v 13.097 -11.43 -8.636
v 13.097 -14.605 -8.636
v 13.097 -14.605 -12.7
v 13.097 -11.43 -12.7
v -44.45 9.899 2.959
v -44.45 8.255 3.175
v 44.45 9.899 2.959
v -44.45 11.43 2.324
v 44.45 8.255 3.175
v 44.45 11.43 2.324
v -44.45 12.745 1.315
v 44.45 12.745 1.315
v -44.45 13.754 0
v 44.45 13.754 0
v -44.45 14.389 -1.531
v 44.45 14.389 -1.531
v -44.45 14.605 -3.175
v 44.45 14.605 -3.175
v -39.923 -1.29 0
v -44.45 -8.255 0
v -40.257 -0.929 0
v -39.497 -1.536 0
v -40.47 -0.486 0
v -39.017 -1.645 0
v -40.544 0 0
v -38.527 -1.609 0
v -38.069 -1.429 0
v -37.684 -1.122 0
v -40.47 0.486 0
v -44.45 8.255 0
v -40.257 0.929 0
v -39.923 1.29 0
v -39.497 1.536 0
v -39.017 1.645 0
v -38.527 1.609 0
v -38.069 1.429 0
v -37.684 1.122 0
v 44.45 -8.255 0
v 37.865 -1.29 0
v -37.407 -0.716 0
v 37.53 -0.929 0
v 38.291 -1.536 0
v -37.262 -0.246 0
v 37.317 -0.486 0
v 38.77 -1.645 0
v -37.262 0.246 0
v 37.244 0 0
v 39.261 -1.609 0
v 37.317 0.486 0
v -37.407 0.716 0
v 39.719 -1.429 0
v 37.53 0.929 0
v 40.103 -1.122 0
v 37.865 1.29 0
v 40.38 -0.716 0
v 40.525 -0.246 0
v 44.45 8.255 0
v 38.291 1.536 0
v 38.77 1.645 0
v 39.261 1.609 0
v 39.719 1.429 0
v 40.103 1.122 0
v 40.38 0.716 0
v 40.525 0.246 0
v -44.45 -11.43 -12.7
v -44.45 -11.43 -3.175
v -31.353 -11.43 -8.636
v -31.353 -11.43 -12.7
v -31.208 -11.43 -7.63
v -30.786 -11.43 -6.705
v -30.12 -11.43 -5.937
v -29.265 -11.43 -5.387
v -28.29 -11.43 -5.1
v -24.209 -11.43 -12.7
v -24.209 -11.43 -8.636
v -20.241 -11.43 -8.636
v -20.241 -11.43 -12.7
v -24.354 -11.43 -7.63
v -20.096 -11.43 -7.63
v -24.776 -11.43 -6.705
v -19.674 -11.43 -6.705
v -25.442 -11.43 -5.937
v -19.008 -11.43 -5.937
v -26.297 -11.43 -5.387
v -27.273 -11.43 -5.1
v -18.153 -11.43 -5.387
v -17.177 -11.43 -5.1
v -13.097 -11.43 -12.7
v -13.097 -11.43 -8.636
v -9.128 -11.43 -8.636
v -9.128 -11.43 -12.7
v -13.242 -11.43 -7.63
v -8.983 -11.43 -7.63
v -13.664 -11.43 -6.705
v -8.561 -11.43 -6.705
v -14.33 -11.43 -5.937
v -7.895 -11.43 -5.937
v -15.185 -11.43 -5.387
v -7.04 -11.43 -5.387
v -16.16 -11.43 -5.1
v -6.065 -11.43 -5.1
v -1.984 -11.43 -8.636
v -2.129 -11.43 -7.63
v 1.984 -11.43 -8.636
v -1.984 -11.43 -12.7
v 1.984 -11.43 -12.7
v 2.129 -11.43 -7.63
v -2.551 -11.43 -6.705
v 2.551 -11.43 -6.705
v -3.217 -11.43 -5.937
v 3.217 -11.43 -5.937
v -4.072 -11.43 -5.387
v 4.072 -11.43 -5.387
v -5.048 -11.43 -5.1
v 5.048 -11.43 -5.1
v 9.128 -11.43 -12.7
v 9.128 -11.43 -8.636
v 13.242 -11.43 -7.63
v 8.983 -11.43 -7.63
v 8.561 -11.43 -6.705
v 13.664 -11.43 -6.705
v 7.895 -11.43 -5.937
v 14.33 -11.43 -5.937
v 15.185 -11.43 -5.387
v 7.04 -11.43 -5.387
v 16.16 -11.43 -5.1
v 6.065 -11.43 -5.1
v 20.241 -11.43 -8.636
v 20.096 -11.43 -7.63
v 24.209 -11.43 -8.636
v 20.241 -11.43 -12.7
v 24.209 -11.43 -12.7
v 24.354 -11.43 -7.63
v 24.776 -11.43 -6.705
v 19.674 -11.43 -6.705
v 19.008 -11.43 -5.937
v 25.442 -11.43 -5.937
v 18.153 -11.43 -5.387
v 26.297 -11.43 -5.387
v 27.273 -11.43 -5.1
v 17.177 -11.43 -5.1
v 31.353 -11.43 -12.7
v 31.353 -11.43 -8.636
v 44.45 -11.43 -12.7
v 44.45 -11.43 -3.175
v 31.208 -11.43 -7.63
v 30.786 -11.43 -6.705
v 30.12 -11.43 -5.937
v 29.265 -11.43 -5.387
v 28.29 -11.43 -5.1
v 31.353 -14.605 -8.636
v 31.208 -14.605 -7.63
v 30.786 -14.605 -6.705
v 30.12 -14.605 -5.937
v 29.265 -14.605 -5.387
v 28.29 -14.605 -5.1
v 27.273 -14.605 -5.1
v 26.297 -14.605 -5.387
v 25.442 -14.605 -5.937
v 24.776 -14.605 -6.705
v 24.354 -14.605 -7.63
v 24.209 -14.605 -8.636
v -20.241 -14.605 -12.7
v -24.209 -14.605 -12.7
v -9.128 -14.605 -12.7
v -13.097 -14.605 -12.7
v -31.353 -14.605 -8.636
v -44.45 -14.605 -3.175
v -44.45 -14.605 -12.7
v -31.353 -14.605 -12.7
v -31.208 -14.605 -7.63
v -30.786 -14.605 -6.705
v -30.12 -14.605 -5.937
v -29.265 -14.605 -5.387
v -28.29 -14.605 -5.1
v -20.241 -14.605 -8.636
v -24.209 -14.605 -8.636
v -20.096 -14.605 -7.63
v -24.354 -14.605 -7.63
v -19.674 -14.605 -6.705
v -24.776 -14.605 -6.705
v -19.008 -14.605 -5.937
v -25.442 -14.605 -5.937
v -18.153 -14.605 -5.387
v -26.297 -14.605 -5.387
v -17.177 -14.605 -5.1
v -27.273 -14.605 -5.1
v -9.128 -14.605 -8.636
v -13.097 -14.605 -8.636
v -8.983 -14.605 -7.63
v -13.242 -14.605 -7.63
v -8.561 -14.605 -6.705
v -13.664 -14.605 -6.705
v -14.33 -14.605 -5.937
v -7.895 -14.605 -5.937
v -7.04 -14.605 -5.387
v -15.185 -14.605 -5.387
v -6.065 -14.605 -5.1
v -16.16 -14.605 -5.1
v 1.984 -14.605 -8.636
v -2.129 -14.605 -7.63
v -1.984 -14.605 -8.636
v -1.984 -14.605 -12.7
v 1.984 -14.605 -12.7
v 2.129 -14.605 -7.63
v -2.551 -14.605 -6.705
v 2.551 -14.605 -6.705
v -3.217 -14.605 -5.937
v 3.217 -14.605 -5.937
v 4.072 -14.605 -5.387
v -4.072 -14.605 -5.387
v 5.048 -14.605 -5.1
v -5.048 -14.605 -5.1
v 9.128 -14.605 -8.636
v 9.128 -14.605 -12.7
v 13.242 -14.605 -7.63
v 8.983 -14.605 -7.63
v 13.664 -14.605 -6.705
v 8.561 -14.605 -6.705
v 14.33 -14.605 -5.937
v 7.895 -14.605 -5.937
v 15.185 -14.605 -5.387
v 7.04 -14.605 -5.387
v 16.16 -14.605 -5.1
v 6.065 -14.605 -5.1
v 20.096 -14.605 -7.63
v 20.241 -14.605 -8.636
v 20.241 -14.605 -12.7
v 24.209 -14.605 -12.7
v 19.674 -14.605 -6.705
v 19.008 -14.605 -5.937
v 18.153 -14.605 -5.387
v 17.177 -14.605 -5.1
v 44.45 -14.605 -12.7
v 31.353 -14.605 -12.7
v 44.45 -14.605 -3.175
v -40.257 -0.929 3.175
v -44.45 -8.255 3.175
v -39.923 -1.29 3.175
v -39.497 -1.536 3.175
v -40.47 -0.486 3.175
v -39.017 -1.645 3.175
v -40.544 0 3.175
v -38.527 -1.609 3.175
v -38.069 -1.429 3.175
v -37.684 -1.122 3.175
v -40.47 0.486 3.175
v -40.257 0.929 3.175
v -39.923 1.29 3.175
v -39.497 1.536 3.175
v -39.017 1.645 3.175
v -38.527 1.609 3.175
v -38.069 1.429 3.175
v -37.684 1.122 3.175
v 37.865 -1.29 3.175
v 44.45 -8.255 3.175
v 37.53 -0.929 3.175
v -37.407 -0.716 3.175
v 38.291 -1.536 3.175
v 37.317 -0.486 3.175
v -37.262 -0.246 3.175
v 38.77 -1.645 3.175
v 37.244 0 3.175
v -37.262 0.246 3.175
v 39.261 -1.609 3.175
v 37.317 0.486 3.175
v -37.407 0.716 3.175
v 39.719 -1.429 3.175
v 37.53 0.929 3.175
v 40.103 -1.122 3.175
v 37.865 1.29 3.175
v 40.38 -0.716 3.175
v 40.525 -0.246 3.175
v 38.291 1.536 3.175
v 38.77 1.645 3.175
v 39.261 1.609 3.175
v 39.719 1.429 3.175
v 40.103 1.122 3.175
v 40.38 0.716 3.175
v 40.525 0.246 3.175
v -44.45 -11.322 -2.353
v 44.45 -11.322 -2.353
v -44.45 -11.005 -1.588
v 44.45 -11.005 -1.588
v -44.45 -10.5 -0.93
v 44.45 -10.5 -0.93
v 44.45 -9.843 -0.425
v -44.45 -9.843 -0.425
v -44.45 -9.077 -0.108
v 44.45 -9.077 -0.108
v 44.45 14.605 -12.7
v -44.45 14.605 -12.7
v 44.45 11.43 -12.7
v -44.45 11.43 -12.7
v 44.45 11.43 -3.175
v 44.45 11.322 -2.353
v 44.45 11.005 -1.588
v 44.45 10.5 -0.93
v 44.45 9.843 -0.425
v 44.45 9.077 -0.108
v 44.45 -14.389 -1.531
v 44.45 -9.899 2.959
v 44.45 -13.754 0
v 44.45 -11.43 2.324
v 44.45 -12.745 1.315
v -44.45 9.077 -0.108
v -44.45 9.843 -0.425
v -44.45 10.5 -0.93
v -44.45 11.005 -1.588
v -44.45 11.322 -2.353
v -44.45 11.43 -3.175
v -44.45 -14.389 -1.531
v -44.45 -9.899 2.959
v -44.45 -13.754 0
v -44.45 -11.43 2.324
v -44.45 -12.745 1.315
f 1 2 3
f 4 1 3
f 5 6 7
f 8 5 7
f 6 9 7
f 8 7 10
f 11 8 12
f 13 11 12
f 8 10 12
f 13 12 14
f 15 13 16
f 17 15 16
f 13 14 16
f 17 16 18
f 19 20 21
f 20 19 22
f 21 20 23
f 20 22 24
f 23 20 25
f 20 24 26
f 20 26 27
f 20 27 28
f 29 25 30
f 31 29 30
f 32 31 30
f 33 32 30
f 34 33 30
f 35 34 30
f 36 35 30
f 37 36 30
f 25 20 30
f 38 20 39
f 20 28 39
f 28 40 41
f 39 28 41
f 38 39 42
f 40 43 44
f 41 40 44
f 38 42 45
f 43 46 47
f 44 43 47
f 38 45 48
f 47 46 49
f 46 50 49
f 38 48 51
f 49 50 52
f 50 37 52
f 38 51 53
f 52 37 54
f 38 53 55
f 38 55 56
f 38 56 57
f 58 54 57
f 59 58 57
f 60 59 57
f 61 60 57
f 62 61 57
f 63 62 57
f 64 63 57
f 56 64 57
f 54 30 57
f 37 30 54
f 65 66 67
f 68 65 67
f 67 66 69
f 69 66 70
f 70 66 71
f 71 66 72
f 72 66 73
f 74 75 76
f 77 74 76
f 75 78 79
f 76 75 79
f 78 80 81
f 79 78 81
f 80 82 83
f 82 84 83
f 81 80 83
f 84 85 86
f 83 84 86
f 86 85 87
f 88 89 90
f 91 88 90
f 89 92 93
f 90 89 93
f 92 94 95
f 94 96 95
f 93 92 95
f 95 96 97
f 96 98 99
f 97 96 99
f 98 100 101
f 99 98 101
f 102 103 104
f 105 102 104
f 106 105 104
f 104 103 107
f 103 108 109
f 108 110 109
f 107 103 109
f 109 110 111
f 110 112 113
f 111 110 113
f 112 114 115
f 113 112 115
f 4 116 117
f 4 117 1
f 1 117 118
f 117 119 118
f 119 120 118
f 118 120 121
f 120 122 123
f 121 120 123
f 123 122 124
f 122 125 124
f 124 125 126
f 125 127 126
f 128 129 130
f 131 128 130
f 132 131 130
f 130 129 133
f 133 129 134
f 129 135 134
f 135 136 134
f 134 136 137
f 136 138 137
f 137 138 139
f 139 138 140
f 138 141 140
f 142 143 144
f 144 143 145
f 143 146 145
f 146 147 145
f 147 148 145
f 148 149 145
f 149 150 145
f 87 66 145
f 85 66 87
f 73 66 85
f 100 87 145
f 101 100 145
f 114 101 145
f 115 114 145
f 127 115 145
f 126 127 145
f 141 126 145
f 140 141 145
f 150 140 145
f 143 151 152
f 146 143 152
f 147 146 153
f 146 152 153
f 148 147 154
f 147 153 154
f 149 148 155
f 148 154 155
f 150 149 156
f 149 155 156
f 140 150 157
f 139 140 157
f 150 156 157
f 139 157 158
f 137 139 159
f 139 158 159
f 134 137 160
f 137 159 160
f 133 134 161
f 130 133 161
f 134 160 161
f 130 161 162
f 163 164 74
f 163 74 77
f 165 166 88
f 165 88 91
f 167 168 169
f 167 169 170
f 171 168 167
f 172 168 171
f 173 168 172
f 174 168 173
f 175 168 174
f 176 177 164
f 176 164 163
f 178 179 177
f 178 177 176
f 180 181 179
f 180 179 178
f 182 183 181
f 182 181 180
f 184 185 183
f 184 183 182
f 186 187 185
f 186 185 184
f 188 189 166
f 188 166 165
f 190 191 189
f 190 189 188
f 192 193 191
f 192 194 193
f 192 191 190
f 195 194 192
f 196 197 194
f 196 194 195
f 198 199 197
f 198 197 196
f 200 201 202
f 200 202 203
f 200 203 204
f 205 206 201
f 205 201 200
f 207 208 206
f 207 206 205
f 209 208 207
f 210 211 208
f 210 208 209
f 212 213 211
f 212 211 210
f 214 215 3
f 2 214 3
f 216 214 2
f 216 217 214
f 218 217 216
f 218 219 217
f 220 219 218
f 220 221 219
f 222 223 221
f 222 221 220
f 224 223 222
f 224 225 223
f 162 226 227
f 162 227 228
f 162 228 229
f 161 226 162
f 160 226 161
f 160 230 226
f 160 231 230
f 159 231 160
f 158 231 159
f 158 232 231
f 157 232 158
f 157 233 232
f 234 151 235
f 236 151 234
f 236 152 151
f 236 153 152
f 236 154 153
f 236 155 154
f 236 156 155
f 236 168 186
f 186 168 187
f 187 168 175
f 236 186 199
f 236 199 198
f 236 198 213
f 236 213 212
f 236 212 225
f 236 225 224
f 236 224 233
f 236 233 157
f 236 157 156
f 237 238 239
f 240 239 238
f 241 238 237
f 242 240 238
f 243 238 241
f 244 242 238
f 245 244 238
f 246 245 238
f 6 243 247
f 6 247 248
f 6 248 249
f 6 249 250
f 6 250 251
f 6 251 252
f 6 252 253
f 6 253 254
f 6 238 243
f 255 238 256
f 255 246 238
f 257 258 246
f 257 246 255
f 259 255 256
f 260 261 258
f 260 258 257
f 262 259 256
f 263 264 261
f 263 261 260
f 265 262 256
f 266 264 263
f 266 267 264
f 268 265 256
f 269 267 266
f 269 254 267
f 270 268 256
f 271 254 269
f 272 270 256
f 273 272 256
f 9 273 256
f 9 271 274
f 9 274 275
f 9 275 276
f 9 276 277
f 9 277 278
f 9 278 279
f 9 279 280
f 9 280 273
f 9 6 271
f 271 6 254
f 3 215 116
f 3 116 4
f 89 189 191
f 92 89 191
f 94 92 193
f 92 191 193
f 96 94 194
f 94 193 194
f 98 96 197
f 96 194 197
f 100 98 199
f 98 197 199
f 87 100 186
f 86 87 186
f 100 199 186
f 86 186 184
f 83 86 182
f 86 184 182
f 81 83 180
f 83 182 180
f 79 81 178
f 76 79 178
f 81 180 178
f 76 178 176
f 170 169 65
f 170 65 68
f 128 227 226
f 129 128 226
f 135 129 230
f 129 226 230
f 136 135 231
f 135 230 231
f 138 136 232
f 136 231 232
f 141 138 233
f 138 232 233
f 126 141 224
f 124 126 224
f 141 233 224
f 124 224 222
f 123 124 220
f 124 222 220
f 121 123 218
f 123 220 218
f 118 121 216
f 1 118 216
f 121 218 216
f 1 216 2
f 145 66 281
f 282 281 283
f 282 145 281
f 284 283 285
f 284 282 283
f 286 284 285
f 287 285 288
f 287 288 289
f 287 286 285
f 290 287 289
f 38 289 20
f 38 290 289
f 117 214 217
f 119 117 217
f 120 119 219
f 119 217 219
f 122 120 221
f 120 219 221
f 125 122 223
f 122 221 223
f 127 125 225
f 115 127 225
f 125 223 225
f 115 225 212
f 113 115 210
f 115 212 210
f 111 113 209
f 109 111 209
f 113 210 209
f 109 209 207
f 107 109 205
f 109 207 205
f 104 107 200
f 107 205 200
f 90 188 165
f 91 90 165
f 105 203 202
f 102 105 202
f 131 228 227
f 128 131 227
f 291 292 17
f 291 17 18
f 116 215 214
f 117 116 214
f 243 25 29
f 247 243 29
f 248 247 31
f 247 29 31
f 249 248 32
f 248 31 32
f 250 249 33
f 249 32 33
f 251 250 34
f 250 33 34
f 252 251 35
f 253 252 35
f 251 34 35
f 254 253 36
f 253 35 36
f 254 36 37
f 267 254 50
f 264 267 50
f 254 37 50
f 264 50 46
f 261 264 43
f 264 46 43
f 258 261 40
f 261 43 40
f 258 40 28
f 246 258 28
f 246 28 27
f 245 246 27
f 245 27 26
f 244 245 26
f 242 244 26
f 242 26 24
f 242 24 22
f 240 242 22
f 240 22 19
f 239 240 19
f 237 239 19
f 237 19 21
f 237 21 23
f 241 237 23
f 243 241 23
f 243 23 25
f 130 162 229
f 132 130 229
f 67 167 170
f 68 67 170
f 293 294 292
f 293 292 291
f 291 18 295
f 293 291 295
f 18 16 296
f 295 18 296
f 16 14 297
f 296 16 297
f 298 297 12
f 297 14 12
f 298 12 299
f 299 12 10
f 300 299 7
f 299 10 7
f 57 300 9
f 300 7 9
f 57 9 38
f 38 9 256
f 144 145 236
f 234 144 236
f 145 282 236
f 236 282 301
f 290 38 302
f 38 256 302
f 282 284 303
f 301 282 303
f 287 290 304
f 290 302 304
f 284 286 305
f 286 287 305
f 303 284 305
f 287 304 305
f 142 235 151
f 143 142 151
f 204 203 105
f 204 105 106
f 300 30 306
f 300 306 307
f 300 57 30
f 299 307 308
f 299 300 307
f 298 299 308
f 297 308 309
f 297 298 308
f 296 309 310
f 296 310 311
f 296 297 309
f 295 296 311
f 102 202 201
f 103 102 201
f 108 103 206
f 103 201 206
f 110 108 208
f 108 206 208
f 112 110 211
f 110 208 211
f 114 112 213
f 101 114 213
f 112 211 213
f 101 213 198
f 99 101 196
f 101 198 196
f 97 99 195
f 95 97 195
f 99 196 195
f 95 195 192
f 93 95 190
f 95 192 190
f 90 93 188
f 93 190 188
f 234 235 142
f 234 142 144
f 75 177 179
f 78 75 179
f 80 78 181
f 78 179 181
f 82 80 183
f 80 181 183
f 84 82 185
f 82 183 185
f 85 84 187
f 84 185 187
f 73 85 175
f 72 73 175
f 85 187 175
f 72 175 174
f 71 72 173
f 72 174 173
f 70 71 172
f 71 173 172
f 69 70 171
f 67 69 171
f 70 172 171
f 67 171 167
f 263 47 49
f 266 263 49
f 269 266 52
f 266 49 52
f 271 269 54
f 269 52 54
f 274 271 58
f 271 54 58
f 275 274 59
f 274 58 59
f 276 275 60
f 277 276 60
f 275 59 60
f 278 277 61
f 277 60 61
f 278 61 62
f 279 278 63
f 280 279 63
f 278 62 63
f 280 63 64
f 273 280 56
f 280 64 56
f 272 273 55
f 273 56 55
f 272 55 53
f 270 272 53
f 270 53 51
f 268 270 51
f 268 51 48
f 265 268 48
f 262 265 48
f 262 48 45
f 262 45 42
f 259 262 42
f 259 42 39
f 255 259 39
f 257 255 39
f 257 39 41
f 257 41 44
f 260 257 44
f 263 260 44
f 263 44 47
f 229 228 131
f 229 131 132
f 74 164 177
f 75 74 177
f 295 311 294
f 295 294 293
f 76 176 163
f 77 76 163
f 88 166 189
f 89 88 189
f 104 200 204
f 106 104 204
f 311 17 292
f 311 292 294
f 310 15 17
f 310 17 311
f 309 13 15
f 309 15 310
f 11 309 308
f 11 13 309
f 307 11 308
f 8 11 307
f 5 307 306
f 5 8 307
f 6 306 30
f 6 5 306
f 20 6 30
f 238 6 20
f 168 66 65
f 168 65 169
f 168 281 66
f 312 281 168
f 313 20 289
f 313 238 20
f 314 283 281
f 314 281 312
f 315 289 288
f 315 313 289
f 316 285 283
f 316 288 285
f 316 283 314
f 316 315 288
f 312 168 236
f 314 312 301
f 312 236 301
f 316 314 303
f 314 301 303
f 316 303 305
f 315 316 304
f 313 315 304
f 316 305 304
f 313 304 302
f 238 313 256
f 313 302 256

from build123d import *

# Parameters (mm, degrees)
F1_W     = 88.9
F1_H     = 29.21
F2_DEPTH = 3.175
F3_W     = 88.9
F3_H     = 3.175
F4_DEPTH = 12.7
F6_D     = 3.3
F8_DEPTH = 3.175
F9_R     = 6.35
F10_R    = 3.175


# Not quite as in the source:
# - a variable given as a bare number and used for a length is read in inches; the dataset says mm whatever the document's units were


with BuildPart() as f2:
    # F1 (on Top) → F2 (new body)
    with BuildSketch(Plane.XY):
        Rectangle(F1_W, F1_H)
    extrude(amount=F2_DEPTH)

    # F3 (on face) → F4 (join)
    with BuildSketch(Plane(origin=(0, 0, 0), x_dir=(1, 0, 0), z_dir=(0, 0, -1))):
        with Locations((0, 13.0175)):
            Rectangle(F3_W, F3_H)
        with Locations((0, -13.0175)):
            Rectangle(F3_W, F3_H)
    extrude(amount=F4_DEPTH)

    # F6 (through all)
    with Locations(Plane.XY.offset(3.175)):
        with Locations((-38.89375, 0), (38.89375, 0)):
            Hole(F6_D / 2)

    # F7 (on face) → F8 (cut)
    with BuildSketch(Plane.XZ.offset(14.605)):
        with BuildLine():
            Line((-31.353125, -8.636), (-24.209375, -8.636))
            ThreePointArc((-24.209375, -8.636), (-27.78125, -5.064125), (-31.353125, -8.636))
        make_face()
        with BuildLine():
            Line((-24.209375, -12.7), (-24.209375, -8.636))
            ThreePointArc((-24.209375, -8.636), (-27.78125, -12.207875), (-31.353125, -8.636))
            Line((-31.353125, -8.636), (-31.353125, -12.7))
            Line((-31.353125, -12.7), (-24.209375, -12.7))
        make_face()
        with BuildLine():
            ThreePointArc((-31.353125, -8.636), (-27.78125, -12.207875), (-24.209375, -8.636))
            Line((-24.209375, -8.636), (-31.353125, -8.636))
        make_face()
        with BuildLine():
            Line((-20.240625, -8.636), (-13.096875, -8.636))
            ThreePointArc((-13.096875, -8.636), (-16.66875, -5.064125), (-20.240625, -8.636))
        make_face()
        with BuildLine():
            Line((-13.096875, -12.7), (-13.096875, -8.636))
            ThreePointArc((-13.096875, -8.636), (-16.66875, -12.207875), (-20.240625, -8.636))
            Line((-20.240625, -8.636), (-20.240625, -12.7))
            Line((-20.240625, -12.7), (-13.096875, -12.7))
        make_face()
        with BuildLine():
            ThreePointArc((-20.240625, -8.636), (-16.66875, -12.207875), (-13.096875, -8.636))
            Line((-13.096875, -8.636), (-20.240625, -8.636))
        make_face()
        with BuildLine():
            Line((-9.128125, -8.636), (-1.984375, -8.636))
            ThreePointArc((-1.984375, -8.636), (-5.55625, -5.064125), (-9.128125, -8.636))
        make_face()
        with BuildLine():
            Line((-1.984375, -12.7), (-1.984375, -8.636))
            ThreePointArc((-1.984375, -8.636), (-5.55625, -12.207875), (-9.128125, -8.636))
            Line((-9.128125, -8.636), (-9.128125, -12.7))
            Line((-9.128125, -12.7), (-1.984375, -12.7))
        make_face()
        with BuildLine():
            ThreePointArc((-9.128125, -8.636), (-5.55625, -12.207875), (-1.984375, -8.636))
            Line((-1.984375, -8.636), (-9.128125, -8.636))
        make_face()
        with BuildLine():
            Line((1.984375, -8.636), (9.128125, -8.636))
            ThreePointArc((9.128125, -8.636), (5.55625, -5.064125), (1.984375, -8.636))
        make_face()
        with BuildLine():
            Line((9.128125, -12.7), (9.128125, -8.636))
            ThreePointArc((9.128125, -8.636), (5.55625, -12.207875), (1.984375, -8.636))
            Line((1.984375, -8.636), (1.984375, -12.7))
            Line((1.984375, -12.7), (9.128125, -12.7))
        make_face()
        with BuildLine():
            ThreePointArc((1.984375, -8.636), (5.55625, -12.207875), (9.128125, -8.636))
            Line((9.128125, -8.636), (1.984375, -8.636))
        make_face()
        with BuildLine():
            Line((13.096875, -8.636), (20.240625, -8.636))
            ThreePointArc((20.240625, -8.636), (16.66875, -5.064125), (13.096875, -8.636))
        make_face()
        with BuildLine():
            Line((20.240625, -12.7), (20.240625, -8.636))
            ThreePointArc((20.240625, -8.636), (16.66875, -12.207875), (13.096875, -8.636))
            Line((13.096875, -8.636), (13.096875, -12.7))
            Line((13.096875, -12.7), (20.240625, -12.7))
        make_face()
        with BuildLine():
            ThreePointArc((13.096875, -8.636), (16.66875, -12.207875), (20.240625, -8.636))
            Line((20.240625, -8.636), (13.096875, -8.636))
        make_face()
        with BuildLine():
            Line((24.209375, -8.636), (31.353125, -8.636))
            ThreePointArc((31.353125, -8.636), (27.78125, -5.064125), (24.209375, -8.636))
        make_face()
        with BuildLine():
            Line((31.353125, -12.7), (31.353125, -8.636))
            ThreePointArc((31.353125, -8.636), (27.78125, -12.207875), (24.209375, -8.636))
            Line((24.209375, -8.636), (24.209375, -12.7))
            Line((24.209375, -12.7), (31.353125, -12.7))
        make_face()
        with BuildLine():
            ThreePointArc((24.209375, -8.636), (27.78125, -12.207875), (31.353125, -8.636))
            Line((31.353125, -8.636), (24.209375, -8.636))
        make_face()
    extrude(amount=-F8_DEPTH, mode=Mode.SUBTRACT)

    # F9
    f9_edges = [f2.edges().sort_by_distance(p)[0] for p in [
        (0, -14.605, 3.175),
        (0, 14.605, 3.175),
    ]]
    fillet(f9_edges, radius=F9_R)

    # F10
    f10_edges = [f2.edges().sort_by_distance(p)[0] for p in [
        (0, 11.43, 0),
        (0, -11.43, 0),
    ]]
    fillet(f10_edges, radius=F10_R)


solid = f2.part
